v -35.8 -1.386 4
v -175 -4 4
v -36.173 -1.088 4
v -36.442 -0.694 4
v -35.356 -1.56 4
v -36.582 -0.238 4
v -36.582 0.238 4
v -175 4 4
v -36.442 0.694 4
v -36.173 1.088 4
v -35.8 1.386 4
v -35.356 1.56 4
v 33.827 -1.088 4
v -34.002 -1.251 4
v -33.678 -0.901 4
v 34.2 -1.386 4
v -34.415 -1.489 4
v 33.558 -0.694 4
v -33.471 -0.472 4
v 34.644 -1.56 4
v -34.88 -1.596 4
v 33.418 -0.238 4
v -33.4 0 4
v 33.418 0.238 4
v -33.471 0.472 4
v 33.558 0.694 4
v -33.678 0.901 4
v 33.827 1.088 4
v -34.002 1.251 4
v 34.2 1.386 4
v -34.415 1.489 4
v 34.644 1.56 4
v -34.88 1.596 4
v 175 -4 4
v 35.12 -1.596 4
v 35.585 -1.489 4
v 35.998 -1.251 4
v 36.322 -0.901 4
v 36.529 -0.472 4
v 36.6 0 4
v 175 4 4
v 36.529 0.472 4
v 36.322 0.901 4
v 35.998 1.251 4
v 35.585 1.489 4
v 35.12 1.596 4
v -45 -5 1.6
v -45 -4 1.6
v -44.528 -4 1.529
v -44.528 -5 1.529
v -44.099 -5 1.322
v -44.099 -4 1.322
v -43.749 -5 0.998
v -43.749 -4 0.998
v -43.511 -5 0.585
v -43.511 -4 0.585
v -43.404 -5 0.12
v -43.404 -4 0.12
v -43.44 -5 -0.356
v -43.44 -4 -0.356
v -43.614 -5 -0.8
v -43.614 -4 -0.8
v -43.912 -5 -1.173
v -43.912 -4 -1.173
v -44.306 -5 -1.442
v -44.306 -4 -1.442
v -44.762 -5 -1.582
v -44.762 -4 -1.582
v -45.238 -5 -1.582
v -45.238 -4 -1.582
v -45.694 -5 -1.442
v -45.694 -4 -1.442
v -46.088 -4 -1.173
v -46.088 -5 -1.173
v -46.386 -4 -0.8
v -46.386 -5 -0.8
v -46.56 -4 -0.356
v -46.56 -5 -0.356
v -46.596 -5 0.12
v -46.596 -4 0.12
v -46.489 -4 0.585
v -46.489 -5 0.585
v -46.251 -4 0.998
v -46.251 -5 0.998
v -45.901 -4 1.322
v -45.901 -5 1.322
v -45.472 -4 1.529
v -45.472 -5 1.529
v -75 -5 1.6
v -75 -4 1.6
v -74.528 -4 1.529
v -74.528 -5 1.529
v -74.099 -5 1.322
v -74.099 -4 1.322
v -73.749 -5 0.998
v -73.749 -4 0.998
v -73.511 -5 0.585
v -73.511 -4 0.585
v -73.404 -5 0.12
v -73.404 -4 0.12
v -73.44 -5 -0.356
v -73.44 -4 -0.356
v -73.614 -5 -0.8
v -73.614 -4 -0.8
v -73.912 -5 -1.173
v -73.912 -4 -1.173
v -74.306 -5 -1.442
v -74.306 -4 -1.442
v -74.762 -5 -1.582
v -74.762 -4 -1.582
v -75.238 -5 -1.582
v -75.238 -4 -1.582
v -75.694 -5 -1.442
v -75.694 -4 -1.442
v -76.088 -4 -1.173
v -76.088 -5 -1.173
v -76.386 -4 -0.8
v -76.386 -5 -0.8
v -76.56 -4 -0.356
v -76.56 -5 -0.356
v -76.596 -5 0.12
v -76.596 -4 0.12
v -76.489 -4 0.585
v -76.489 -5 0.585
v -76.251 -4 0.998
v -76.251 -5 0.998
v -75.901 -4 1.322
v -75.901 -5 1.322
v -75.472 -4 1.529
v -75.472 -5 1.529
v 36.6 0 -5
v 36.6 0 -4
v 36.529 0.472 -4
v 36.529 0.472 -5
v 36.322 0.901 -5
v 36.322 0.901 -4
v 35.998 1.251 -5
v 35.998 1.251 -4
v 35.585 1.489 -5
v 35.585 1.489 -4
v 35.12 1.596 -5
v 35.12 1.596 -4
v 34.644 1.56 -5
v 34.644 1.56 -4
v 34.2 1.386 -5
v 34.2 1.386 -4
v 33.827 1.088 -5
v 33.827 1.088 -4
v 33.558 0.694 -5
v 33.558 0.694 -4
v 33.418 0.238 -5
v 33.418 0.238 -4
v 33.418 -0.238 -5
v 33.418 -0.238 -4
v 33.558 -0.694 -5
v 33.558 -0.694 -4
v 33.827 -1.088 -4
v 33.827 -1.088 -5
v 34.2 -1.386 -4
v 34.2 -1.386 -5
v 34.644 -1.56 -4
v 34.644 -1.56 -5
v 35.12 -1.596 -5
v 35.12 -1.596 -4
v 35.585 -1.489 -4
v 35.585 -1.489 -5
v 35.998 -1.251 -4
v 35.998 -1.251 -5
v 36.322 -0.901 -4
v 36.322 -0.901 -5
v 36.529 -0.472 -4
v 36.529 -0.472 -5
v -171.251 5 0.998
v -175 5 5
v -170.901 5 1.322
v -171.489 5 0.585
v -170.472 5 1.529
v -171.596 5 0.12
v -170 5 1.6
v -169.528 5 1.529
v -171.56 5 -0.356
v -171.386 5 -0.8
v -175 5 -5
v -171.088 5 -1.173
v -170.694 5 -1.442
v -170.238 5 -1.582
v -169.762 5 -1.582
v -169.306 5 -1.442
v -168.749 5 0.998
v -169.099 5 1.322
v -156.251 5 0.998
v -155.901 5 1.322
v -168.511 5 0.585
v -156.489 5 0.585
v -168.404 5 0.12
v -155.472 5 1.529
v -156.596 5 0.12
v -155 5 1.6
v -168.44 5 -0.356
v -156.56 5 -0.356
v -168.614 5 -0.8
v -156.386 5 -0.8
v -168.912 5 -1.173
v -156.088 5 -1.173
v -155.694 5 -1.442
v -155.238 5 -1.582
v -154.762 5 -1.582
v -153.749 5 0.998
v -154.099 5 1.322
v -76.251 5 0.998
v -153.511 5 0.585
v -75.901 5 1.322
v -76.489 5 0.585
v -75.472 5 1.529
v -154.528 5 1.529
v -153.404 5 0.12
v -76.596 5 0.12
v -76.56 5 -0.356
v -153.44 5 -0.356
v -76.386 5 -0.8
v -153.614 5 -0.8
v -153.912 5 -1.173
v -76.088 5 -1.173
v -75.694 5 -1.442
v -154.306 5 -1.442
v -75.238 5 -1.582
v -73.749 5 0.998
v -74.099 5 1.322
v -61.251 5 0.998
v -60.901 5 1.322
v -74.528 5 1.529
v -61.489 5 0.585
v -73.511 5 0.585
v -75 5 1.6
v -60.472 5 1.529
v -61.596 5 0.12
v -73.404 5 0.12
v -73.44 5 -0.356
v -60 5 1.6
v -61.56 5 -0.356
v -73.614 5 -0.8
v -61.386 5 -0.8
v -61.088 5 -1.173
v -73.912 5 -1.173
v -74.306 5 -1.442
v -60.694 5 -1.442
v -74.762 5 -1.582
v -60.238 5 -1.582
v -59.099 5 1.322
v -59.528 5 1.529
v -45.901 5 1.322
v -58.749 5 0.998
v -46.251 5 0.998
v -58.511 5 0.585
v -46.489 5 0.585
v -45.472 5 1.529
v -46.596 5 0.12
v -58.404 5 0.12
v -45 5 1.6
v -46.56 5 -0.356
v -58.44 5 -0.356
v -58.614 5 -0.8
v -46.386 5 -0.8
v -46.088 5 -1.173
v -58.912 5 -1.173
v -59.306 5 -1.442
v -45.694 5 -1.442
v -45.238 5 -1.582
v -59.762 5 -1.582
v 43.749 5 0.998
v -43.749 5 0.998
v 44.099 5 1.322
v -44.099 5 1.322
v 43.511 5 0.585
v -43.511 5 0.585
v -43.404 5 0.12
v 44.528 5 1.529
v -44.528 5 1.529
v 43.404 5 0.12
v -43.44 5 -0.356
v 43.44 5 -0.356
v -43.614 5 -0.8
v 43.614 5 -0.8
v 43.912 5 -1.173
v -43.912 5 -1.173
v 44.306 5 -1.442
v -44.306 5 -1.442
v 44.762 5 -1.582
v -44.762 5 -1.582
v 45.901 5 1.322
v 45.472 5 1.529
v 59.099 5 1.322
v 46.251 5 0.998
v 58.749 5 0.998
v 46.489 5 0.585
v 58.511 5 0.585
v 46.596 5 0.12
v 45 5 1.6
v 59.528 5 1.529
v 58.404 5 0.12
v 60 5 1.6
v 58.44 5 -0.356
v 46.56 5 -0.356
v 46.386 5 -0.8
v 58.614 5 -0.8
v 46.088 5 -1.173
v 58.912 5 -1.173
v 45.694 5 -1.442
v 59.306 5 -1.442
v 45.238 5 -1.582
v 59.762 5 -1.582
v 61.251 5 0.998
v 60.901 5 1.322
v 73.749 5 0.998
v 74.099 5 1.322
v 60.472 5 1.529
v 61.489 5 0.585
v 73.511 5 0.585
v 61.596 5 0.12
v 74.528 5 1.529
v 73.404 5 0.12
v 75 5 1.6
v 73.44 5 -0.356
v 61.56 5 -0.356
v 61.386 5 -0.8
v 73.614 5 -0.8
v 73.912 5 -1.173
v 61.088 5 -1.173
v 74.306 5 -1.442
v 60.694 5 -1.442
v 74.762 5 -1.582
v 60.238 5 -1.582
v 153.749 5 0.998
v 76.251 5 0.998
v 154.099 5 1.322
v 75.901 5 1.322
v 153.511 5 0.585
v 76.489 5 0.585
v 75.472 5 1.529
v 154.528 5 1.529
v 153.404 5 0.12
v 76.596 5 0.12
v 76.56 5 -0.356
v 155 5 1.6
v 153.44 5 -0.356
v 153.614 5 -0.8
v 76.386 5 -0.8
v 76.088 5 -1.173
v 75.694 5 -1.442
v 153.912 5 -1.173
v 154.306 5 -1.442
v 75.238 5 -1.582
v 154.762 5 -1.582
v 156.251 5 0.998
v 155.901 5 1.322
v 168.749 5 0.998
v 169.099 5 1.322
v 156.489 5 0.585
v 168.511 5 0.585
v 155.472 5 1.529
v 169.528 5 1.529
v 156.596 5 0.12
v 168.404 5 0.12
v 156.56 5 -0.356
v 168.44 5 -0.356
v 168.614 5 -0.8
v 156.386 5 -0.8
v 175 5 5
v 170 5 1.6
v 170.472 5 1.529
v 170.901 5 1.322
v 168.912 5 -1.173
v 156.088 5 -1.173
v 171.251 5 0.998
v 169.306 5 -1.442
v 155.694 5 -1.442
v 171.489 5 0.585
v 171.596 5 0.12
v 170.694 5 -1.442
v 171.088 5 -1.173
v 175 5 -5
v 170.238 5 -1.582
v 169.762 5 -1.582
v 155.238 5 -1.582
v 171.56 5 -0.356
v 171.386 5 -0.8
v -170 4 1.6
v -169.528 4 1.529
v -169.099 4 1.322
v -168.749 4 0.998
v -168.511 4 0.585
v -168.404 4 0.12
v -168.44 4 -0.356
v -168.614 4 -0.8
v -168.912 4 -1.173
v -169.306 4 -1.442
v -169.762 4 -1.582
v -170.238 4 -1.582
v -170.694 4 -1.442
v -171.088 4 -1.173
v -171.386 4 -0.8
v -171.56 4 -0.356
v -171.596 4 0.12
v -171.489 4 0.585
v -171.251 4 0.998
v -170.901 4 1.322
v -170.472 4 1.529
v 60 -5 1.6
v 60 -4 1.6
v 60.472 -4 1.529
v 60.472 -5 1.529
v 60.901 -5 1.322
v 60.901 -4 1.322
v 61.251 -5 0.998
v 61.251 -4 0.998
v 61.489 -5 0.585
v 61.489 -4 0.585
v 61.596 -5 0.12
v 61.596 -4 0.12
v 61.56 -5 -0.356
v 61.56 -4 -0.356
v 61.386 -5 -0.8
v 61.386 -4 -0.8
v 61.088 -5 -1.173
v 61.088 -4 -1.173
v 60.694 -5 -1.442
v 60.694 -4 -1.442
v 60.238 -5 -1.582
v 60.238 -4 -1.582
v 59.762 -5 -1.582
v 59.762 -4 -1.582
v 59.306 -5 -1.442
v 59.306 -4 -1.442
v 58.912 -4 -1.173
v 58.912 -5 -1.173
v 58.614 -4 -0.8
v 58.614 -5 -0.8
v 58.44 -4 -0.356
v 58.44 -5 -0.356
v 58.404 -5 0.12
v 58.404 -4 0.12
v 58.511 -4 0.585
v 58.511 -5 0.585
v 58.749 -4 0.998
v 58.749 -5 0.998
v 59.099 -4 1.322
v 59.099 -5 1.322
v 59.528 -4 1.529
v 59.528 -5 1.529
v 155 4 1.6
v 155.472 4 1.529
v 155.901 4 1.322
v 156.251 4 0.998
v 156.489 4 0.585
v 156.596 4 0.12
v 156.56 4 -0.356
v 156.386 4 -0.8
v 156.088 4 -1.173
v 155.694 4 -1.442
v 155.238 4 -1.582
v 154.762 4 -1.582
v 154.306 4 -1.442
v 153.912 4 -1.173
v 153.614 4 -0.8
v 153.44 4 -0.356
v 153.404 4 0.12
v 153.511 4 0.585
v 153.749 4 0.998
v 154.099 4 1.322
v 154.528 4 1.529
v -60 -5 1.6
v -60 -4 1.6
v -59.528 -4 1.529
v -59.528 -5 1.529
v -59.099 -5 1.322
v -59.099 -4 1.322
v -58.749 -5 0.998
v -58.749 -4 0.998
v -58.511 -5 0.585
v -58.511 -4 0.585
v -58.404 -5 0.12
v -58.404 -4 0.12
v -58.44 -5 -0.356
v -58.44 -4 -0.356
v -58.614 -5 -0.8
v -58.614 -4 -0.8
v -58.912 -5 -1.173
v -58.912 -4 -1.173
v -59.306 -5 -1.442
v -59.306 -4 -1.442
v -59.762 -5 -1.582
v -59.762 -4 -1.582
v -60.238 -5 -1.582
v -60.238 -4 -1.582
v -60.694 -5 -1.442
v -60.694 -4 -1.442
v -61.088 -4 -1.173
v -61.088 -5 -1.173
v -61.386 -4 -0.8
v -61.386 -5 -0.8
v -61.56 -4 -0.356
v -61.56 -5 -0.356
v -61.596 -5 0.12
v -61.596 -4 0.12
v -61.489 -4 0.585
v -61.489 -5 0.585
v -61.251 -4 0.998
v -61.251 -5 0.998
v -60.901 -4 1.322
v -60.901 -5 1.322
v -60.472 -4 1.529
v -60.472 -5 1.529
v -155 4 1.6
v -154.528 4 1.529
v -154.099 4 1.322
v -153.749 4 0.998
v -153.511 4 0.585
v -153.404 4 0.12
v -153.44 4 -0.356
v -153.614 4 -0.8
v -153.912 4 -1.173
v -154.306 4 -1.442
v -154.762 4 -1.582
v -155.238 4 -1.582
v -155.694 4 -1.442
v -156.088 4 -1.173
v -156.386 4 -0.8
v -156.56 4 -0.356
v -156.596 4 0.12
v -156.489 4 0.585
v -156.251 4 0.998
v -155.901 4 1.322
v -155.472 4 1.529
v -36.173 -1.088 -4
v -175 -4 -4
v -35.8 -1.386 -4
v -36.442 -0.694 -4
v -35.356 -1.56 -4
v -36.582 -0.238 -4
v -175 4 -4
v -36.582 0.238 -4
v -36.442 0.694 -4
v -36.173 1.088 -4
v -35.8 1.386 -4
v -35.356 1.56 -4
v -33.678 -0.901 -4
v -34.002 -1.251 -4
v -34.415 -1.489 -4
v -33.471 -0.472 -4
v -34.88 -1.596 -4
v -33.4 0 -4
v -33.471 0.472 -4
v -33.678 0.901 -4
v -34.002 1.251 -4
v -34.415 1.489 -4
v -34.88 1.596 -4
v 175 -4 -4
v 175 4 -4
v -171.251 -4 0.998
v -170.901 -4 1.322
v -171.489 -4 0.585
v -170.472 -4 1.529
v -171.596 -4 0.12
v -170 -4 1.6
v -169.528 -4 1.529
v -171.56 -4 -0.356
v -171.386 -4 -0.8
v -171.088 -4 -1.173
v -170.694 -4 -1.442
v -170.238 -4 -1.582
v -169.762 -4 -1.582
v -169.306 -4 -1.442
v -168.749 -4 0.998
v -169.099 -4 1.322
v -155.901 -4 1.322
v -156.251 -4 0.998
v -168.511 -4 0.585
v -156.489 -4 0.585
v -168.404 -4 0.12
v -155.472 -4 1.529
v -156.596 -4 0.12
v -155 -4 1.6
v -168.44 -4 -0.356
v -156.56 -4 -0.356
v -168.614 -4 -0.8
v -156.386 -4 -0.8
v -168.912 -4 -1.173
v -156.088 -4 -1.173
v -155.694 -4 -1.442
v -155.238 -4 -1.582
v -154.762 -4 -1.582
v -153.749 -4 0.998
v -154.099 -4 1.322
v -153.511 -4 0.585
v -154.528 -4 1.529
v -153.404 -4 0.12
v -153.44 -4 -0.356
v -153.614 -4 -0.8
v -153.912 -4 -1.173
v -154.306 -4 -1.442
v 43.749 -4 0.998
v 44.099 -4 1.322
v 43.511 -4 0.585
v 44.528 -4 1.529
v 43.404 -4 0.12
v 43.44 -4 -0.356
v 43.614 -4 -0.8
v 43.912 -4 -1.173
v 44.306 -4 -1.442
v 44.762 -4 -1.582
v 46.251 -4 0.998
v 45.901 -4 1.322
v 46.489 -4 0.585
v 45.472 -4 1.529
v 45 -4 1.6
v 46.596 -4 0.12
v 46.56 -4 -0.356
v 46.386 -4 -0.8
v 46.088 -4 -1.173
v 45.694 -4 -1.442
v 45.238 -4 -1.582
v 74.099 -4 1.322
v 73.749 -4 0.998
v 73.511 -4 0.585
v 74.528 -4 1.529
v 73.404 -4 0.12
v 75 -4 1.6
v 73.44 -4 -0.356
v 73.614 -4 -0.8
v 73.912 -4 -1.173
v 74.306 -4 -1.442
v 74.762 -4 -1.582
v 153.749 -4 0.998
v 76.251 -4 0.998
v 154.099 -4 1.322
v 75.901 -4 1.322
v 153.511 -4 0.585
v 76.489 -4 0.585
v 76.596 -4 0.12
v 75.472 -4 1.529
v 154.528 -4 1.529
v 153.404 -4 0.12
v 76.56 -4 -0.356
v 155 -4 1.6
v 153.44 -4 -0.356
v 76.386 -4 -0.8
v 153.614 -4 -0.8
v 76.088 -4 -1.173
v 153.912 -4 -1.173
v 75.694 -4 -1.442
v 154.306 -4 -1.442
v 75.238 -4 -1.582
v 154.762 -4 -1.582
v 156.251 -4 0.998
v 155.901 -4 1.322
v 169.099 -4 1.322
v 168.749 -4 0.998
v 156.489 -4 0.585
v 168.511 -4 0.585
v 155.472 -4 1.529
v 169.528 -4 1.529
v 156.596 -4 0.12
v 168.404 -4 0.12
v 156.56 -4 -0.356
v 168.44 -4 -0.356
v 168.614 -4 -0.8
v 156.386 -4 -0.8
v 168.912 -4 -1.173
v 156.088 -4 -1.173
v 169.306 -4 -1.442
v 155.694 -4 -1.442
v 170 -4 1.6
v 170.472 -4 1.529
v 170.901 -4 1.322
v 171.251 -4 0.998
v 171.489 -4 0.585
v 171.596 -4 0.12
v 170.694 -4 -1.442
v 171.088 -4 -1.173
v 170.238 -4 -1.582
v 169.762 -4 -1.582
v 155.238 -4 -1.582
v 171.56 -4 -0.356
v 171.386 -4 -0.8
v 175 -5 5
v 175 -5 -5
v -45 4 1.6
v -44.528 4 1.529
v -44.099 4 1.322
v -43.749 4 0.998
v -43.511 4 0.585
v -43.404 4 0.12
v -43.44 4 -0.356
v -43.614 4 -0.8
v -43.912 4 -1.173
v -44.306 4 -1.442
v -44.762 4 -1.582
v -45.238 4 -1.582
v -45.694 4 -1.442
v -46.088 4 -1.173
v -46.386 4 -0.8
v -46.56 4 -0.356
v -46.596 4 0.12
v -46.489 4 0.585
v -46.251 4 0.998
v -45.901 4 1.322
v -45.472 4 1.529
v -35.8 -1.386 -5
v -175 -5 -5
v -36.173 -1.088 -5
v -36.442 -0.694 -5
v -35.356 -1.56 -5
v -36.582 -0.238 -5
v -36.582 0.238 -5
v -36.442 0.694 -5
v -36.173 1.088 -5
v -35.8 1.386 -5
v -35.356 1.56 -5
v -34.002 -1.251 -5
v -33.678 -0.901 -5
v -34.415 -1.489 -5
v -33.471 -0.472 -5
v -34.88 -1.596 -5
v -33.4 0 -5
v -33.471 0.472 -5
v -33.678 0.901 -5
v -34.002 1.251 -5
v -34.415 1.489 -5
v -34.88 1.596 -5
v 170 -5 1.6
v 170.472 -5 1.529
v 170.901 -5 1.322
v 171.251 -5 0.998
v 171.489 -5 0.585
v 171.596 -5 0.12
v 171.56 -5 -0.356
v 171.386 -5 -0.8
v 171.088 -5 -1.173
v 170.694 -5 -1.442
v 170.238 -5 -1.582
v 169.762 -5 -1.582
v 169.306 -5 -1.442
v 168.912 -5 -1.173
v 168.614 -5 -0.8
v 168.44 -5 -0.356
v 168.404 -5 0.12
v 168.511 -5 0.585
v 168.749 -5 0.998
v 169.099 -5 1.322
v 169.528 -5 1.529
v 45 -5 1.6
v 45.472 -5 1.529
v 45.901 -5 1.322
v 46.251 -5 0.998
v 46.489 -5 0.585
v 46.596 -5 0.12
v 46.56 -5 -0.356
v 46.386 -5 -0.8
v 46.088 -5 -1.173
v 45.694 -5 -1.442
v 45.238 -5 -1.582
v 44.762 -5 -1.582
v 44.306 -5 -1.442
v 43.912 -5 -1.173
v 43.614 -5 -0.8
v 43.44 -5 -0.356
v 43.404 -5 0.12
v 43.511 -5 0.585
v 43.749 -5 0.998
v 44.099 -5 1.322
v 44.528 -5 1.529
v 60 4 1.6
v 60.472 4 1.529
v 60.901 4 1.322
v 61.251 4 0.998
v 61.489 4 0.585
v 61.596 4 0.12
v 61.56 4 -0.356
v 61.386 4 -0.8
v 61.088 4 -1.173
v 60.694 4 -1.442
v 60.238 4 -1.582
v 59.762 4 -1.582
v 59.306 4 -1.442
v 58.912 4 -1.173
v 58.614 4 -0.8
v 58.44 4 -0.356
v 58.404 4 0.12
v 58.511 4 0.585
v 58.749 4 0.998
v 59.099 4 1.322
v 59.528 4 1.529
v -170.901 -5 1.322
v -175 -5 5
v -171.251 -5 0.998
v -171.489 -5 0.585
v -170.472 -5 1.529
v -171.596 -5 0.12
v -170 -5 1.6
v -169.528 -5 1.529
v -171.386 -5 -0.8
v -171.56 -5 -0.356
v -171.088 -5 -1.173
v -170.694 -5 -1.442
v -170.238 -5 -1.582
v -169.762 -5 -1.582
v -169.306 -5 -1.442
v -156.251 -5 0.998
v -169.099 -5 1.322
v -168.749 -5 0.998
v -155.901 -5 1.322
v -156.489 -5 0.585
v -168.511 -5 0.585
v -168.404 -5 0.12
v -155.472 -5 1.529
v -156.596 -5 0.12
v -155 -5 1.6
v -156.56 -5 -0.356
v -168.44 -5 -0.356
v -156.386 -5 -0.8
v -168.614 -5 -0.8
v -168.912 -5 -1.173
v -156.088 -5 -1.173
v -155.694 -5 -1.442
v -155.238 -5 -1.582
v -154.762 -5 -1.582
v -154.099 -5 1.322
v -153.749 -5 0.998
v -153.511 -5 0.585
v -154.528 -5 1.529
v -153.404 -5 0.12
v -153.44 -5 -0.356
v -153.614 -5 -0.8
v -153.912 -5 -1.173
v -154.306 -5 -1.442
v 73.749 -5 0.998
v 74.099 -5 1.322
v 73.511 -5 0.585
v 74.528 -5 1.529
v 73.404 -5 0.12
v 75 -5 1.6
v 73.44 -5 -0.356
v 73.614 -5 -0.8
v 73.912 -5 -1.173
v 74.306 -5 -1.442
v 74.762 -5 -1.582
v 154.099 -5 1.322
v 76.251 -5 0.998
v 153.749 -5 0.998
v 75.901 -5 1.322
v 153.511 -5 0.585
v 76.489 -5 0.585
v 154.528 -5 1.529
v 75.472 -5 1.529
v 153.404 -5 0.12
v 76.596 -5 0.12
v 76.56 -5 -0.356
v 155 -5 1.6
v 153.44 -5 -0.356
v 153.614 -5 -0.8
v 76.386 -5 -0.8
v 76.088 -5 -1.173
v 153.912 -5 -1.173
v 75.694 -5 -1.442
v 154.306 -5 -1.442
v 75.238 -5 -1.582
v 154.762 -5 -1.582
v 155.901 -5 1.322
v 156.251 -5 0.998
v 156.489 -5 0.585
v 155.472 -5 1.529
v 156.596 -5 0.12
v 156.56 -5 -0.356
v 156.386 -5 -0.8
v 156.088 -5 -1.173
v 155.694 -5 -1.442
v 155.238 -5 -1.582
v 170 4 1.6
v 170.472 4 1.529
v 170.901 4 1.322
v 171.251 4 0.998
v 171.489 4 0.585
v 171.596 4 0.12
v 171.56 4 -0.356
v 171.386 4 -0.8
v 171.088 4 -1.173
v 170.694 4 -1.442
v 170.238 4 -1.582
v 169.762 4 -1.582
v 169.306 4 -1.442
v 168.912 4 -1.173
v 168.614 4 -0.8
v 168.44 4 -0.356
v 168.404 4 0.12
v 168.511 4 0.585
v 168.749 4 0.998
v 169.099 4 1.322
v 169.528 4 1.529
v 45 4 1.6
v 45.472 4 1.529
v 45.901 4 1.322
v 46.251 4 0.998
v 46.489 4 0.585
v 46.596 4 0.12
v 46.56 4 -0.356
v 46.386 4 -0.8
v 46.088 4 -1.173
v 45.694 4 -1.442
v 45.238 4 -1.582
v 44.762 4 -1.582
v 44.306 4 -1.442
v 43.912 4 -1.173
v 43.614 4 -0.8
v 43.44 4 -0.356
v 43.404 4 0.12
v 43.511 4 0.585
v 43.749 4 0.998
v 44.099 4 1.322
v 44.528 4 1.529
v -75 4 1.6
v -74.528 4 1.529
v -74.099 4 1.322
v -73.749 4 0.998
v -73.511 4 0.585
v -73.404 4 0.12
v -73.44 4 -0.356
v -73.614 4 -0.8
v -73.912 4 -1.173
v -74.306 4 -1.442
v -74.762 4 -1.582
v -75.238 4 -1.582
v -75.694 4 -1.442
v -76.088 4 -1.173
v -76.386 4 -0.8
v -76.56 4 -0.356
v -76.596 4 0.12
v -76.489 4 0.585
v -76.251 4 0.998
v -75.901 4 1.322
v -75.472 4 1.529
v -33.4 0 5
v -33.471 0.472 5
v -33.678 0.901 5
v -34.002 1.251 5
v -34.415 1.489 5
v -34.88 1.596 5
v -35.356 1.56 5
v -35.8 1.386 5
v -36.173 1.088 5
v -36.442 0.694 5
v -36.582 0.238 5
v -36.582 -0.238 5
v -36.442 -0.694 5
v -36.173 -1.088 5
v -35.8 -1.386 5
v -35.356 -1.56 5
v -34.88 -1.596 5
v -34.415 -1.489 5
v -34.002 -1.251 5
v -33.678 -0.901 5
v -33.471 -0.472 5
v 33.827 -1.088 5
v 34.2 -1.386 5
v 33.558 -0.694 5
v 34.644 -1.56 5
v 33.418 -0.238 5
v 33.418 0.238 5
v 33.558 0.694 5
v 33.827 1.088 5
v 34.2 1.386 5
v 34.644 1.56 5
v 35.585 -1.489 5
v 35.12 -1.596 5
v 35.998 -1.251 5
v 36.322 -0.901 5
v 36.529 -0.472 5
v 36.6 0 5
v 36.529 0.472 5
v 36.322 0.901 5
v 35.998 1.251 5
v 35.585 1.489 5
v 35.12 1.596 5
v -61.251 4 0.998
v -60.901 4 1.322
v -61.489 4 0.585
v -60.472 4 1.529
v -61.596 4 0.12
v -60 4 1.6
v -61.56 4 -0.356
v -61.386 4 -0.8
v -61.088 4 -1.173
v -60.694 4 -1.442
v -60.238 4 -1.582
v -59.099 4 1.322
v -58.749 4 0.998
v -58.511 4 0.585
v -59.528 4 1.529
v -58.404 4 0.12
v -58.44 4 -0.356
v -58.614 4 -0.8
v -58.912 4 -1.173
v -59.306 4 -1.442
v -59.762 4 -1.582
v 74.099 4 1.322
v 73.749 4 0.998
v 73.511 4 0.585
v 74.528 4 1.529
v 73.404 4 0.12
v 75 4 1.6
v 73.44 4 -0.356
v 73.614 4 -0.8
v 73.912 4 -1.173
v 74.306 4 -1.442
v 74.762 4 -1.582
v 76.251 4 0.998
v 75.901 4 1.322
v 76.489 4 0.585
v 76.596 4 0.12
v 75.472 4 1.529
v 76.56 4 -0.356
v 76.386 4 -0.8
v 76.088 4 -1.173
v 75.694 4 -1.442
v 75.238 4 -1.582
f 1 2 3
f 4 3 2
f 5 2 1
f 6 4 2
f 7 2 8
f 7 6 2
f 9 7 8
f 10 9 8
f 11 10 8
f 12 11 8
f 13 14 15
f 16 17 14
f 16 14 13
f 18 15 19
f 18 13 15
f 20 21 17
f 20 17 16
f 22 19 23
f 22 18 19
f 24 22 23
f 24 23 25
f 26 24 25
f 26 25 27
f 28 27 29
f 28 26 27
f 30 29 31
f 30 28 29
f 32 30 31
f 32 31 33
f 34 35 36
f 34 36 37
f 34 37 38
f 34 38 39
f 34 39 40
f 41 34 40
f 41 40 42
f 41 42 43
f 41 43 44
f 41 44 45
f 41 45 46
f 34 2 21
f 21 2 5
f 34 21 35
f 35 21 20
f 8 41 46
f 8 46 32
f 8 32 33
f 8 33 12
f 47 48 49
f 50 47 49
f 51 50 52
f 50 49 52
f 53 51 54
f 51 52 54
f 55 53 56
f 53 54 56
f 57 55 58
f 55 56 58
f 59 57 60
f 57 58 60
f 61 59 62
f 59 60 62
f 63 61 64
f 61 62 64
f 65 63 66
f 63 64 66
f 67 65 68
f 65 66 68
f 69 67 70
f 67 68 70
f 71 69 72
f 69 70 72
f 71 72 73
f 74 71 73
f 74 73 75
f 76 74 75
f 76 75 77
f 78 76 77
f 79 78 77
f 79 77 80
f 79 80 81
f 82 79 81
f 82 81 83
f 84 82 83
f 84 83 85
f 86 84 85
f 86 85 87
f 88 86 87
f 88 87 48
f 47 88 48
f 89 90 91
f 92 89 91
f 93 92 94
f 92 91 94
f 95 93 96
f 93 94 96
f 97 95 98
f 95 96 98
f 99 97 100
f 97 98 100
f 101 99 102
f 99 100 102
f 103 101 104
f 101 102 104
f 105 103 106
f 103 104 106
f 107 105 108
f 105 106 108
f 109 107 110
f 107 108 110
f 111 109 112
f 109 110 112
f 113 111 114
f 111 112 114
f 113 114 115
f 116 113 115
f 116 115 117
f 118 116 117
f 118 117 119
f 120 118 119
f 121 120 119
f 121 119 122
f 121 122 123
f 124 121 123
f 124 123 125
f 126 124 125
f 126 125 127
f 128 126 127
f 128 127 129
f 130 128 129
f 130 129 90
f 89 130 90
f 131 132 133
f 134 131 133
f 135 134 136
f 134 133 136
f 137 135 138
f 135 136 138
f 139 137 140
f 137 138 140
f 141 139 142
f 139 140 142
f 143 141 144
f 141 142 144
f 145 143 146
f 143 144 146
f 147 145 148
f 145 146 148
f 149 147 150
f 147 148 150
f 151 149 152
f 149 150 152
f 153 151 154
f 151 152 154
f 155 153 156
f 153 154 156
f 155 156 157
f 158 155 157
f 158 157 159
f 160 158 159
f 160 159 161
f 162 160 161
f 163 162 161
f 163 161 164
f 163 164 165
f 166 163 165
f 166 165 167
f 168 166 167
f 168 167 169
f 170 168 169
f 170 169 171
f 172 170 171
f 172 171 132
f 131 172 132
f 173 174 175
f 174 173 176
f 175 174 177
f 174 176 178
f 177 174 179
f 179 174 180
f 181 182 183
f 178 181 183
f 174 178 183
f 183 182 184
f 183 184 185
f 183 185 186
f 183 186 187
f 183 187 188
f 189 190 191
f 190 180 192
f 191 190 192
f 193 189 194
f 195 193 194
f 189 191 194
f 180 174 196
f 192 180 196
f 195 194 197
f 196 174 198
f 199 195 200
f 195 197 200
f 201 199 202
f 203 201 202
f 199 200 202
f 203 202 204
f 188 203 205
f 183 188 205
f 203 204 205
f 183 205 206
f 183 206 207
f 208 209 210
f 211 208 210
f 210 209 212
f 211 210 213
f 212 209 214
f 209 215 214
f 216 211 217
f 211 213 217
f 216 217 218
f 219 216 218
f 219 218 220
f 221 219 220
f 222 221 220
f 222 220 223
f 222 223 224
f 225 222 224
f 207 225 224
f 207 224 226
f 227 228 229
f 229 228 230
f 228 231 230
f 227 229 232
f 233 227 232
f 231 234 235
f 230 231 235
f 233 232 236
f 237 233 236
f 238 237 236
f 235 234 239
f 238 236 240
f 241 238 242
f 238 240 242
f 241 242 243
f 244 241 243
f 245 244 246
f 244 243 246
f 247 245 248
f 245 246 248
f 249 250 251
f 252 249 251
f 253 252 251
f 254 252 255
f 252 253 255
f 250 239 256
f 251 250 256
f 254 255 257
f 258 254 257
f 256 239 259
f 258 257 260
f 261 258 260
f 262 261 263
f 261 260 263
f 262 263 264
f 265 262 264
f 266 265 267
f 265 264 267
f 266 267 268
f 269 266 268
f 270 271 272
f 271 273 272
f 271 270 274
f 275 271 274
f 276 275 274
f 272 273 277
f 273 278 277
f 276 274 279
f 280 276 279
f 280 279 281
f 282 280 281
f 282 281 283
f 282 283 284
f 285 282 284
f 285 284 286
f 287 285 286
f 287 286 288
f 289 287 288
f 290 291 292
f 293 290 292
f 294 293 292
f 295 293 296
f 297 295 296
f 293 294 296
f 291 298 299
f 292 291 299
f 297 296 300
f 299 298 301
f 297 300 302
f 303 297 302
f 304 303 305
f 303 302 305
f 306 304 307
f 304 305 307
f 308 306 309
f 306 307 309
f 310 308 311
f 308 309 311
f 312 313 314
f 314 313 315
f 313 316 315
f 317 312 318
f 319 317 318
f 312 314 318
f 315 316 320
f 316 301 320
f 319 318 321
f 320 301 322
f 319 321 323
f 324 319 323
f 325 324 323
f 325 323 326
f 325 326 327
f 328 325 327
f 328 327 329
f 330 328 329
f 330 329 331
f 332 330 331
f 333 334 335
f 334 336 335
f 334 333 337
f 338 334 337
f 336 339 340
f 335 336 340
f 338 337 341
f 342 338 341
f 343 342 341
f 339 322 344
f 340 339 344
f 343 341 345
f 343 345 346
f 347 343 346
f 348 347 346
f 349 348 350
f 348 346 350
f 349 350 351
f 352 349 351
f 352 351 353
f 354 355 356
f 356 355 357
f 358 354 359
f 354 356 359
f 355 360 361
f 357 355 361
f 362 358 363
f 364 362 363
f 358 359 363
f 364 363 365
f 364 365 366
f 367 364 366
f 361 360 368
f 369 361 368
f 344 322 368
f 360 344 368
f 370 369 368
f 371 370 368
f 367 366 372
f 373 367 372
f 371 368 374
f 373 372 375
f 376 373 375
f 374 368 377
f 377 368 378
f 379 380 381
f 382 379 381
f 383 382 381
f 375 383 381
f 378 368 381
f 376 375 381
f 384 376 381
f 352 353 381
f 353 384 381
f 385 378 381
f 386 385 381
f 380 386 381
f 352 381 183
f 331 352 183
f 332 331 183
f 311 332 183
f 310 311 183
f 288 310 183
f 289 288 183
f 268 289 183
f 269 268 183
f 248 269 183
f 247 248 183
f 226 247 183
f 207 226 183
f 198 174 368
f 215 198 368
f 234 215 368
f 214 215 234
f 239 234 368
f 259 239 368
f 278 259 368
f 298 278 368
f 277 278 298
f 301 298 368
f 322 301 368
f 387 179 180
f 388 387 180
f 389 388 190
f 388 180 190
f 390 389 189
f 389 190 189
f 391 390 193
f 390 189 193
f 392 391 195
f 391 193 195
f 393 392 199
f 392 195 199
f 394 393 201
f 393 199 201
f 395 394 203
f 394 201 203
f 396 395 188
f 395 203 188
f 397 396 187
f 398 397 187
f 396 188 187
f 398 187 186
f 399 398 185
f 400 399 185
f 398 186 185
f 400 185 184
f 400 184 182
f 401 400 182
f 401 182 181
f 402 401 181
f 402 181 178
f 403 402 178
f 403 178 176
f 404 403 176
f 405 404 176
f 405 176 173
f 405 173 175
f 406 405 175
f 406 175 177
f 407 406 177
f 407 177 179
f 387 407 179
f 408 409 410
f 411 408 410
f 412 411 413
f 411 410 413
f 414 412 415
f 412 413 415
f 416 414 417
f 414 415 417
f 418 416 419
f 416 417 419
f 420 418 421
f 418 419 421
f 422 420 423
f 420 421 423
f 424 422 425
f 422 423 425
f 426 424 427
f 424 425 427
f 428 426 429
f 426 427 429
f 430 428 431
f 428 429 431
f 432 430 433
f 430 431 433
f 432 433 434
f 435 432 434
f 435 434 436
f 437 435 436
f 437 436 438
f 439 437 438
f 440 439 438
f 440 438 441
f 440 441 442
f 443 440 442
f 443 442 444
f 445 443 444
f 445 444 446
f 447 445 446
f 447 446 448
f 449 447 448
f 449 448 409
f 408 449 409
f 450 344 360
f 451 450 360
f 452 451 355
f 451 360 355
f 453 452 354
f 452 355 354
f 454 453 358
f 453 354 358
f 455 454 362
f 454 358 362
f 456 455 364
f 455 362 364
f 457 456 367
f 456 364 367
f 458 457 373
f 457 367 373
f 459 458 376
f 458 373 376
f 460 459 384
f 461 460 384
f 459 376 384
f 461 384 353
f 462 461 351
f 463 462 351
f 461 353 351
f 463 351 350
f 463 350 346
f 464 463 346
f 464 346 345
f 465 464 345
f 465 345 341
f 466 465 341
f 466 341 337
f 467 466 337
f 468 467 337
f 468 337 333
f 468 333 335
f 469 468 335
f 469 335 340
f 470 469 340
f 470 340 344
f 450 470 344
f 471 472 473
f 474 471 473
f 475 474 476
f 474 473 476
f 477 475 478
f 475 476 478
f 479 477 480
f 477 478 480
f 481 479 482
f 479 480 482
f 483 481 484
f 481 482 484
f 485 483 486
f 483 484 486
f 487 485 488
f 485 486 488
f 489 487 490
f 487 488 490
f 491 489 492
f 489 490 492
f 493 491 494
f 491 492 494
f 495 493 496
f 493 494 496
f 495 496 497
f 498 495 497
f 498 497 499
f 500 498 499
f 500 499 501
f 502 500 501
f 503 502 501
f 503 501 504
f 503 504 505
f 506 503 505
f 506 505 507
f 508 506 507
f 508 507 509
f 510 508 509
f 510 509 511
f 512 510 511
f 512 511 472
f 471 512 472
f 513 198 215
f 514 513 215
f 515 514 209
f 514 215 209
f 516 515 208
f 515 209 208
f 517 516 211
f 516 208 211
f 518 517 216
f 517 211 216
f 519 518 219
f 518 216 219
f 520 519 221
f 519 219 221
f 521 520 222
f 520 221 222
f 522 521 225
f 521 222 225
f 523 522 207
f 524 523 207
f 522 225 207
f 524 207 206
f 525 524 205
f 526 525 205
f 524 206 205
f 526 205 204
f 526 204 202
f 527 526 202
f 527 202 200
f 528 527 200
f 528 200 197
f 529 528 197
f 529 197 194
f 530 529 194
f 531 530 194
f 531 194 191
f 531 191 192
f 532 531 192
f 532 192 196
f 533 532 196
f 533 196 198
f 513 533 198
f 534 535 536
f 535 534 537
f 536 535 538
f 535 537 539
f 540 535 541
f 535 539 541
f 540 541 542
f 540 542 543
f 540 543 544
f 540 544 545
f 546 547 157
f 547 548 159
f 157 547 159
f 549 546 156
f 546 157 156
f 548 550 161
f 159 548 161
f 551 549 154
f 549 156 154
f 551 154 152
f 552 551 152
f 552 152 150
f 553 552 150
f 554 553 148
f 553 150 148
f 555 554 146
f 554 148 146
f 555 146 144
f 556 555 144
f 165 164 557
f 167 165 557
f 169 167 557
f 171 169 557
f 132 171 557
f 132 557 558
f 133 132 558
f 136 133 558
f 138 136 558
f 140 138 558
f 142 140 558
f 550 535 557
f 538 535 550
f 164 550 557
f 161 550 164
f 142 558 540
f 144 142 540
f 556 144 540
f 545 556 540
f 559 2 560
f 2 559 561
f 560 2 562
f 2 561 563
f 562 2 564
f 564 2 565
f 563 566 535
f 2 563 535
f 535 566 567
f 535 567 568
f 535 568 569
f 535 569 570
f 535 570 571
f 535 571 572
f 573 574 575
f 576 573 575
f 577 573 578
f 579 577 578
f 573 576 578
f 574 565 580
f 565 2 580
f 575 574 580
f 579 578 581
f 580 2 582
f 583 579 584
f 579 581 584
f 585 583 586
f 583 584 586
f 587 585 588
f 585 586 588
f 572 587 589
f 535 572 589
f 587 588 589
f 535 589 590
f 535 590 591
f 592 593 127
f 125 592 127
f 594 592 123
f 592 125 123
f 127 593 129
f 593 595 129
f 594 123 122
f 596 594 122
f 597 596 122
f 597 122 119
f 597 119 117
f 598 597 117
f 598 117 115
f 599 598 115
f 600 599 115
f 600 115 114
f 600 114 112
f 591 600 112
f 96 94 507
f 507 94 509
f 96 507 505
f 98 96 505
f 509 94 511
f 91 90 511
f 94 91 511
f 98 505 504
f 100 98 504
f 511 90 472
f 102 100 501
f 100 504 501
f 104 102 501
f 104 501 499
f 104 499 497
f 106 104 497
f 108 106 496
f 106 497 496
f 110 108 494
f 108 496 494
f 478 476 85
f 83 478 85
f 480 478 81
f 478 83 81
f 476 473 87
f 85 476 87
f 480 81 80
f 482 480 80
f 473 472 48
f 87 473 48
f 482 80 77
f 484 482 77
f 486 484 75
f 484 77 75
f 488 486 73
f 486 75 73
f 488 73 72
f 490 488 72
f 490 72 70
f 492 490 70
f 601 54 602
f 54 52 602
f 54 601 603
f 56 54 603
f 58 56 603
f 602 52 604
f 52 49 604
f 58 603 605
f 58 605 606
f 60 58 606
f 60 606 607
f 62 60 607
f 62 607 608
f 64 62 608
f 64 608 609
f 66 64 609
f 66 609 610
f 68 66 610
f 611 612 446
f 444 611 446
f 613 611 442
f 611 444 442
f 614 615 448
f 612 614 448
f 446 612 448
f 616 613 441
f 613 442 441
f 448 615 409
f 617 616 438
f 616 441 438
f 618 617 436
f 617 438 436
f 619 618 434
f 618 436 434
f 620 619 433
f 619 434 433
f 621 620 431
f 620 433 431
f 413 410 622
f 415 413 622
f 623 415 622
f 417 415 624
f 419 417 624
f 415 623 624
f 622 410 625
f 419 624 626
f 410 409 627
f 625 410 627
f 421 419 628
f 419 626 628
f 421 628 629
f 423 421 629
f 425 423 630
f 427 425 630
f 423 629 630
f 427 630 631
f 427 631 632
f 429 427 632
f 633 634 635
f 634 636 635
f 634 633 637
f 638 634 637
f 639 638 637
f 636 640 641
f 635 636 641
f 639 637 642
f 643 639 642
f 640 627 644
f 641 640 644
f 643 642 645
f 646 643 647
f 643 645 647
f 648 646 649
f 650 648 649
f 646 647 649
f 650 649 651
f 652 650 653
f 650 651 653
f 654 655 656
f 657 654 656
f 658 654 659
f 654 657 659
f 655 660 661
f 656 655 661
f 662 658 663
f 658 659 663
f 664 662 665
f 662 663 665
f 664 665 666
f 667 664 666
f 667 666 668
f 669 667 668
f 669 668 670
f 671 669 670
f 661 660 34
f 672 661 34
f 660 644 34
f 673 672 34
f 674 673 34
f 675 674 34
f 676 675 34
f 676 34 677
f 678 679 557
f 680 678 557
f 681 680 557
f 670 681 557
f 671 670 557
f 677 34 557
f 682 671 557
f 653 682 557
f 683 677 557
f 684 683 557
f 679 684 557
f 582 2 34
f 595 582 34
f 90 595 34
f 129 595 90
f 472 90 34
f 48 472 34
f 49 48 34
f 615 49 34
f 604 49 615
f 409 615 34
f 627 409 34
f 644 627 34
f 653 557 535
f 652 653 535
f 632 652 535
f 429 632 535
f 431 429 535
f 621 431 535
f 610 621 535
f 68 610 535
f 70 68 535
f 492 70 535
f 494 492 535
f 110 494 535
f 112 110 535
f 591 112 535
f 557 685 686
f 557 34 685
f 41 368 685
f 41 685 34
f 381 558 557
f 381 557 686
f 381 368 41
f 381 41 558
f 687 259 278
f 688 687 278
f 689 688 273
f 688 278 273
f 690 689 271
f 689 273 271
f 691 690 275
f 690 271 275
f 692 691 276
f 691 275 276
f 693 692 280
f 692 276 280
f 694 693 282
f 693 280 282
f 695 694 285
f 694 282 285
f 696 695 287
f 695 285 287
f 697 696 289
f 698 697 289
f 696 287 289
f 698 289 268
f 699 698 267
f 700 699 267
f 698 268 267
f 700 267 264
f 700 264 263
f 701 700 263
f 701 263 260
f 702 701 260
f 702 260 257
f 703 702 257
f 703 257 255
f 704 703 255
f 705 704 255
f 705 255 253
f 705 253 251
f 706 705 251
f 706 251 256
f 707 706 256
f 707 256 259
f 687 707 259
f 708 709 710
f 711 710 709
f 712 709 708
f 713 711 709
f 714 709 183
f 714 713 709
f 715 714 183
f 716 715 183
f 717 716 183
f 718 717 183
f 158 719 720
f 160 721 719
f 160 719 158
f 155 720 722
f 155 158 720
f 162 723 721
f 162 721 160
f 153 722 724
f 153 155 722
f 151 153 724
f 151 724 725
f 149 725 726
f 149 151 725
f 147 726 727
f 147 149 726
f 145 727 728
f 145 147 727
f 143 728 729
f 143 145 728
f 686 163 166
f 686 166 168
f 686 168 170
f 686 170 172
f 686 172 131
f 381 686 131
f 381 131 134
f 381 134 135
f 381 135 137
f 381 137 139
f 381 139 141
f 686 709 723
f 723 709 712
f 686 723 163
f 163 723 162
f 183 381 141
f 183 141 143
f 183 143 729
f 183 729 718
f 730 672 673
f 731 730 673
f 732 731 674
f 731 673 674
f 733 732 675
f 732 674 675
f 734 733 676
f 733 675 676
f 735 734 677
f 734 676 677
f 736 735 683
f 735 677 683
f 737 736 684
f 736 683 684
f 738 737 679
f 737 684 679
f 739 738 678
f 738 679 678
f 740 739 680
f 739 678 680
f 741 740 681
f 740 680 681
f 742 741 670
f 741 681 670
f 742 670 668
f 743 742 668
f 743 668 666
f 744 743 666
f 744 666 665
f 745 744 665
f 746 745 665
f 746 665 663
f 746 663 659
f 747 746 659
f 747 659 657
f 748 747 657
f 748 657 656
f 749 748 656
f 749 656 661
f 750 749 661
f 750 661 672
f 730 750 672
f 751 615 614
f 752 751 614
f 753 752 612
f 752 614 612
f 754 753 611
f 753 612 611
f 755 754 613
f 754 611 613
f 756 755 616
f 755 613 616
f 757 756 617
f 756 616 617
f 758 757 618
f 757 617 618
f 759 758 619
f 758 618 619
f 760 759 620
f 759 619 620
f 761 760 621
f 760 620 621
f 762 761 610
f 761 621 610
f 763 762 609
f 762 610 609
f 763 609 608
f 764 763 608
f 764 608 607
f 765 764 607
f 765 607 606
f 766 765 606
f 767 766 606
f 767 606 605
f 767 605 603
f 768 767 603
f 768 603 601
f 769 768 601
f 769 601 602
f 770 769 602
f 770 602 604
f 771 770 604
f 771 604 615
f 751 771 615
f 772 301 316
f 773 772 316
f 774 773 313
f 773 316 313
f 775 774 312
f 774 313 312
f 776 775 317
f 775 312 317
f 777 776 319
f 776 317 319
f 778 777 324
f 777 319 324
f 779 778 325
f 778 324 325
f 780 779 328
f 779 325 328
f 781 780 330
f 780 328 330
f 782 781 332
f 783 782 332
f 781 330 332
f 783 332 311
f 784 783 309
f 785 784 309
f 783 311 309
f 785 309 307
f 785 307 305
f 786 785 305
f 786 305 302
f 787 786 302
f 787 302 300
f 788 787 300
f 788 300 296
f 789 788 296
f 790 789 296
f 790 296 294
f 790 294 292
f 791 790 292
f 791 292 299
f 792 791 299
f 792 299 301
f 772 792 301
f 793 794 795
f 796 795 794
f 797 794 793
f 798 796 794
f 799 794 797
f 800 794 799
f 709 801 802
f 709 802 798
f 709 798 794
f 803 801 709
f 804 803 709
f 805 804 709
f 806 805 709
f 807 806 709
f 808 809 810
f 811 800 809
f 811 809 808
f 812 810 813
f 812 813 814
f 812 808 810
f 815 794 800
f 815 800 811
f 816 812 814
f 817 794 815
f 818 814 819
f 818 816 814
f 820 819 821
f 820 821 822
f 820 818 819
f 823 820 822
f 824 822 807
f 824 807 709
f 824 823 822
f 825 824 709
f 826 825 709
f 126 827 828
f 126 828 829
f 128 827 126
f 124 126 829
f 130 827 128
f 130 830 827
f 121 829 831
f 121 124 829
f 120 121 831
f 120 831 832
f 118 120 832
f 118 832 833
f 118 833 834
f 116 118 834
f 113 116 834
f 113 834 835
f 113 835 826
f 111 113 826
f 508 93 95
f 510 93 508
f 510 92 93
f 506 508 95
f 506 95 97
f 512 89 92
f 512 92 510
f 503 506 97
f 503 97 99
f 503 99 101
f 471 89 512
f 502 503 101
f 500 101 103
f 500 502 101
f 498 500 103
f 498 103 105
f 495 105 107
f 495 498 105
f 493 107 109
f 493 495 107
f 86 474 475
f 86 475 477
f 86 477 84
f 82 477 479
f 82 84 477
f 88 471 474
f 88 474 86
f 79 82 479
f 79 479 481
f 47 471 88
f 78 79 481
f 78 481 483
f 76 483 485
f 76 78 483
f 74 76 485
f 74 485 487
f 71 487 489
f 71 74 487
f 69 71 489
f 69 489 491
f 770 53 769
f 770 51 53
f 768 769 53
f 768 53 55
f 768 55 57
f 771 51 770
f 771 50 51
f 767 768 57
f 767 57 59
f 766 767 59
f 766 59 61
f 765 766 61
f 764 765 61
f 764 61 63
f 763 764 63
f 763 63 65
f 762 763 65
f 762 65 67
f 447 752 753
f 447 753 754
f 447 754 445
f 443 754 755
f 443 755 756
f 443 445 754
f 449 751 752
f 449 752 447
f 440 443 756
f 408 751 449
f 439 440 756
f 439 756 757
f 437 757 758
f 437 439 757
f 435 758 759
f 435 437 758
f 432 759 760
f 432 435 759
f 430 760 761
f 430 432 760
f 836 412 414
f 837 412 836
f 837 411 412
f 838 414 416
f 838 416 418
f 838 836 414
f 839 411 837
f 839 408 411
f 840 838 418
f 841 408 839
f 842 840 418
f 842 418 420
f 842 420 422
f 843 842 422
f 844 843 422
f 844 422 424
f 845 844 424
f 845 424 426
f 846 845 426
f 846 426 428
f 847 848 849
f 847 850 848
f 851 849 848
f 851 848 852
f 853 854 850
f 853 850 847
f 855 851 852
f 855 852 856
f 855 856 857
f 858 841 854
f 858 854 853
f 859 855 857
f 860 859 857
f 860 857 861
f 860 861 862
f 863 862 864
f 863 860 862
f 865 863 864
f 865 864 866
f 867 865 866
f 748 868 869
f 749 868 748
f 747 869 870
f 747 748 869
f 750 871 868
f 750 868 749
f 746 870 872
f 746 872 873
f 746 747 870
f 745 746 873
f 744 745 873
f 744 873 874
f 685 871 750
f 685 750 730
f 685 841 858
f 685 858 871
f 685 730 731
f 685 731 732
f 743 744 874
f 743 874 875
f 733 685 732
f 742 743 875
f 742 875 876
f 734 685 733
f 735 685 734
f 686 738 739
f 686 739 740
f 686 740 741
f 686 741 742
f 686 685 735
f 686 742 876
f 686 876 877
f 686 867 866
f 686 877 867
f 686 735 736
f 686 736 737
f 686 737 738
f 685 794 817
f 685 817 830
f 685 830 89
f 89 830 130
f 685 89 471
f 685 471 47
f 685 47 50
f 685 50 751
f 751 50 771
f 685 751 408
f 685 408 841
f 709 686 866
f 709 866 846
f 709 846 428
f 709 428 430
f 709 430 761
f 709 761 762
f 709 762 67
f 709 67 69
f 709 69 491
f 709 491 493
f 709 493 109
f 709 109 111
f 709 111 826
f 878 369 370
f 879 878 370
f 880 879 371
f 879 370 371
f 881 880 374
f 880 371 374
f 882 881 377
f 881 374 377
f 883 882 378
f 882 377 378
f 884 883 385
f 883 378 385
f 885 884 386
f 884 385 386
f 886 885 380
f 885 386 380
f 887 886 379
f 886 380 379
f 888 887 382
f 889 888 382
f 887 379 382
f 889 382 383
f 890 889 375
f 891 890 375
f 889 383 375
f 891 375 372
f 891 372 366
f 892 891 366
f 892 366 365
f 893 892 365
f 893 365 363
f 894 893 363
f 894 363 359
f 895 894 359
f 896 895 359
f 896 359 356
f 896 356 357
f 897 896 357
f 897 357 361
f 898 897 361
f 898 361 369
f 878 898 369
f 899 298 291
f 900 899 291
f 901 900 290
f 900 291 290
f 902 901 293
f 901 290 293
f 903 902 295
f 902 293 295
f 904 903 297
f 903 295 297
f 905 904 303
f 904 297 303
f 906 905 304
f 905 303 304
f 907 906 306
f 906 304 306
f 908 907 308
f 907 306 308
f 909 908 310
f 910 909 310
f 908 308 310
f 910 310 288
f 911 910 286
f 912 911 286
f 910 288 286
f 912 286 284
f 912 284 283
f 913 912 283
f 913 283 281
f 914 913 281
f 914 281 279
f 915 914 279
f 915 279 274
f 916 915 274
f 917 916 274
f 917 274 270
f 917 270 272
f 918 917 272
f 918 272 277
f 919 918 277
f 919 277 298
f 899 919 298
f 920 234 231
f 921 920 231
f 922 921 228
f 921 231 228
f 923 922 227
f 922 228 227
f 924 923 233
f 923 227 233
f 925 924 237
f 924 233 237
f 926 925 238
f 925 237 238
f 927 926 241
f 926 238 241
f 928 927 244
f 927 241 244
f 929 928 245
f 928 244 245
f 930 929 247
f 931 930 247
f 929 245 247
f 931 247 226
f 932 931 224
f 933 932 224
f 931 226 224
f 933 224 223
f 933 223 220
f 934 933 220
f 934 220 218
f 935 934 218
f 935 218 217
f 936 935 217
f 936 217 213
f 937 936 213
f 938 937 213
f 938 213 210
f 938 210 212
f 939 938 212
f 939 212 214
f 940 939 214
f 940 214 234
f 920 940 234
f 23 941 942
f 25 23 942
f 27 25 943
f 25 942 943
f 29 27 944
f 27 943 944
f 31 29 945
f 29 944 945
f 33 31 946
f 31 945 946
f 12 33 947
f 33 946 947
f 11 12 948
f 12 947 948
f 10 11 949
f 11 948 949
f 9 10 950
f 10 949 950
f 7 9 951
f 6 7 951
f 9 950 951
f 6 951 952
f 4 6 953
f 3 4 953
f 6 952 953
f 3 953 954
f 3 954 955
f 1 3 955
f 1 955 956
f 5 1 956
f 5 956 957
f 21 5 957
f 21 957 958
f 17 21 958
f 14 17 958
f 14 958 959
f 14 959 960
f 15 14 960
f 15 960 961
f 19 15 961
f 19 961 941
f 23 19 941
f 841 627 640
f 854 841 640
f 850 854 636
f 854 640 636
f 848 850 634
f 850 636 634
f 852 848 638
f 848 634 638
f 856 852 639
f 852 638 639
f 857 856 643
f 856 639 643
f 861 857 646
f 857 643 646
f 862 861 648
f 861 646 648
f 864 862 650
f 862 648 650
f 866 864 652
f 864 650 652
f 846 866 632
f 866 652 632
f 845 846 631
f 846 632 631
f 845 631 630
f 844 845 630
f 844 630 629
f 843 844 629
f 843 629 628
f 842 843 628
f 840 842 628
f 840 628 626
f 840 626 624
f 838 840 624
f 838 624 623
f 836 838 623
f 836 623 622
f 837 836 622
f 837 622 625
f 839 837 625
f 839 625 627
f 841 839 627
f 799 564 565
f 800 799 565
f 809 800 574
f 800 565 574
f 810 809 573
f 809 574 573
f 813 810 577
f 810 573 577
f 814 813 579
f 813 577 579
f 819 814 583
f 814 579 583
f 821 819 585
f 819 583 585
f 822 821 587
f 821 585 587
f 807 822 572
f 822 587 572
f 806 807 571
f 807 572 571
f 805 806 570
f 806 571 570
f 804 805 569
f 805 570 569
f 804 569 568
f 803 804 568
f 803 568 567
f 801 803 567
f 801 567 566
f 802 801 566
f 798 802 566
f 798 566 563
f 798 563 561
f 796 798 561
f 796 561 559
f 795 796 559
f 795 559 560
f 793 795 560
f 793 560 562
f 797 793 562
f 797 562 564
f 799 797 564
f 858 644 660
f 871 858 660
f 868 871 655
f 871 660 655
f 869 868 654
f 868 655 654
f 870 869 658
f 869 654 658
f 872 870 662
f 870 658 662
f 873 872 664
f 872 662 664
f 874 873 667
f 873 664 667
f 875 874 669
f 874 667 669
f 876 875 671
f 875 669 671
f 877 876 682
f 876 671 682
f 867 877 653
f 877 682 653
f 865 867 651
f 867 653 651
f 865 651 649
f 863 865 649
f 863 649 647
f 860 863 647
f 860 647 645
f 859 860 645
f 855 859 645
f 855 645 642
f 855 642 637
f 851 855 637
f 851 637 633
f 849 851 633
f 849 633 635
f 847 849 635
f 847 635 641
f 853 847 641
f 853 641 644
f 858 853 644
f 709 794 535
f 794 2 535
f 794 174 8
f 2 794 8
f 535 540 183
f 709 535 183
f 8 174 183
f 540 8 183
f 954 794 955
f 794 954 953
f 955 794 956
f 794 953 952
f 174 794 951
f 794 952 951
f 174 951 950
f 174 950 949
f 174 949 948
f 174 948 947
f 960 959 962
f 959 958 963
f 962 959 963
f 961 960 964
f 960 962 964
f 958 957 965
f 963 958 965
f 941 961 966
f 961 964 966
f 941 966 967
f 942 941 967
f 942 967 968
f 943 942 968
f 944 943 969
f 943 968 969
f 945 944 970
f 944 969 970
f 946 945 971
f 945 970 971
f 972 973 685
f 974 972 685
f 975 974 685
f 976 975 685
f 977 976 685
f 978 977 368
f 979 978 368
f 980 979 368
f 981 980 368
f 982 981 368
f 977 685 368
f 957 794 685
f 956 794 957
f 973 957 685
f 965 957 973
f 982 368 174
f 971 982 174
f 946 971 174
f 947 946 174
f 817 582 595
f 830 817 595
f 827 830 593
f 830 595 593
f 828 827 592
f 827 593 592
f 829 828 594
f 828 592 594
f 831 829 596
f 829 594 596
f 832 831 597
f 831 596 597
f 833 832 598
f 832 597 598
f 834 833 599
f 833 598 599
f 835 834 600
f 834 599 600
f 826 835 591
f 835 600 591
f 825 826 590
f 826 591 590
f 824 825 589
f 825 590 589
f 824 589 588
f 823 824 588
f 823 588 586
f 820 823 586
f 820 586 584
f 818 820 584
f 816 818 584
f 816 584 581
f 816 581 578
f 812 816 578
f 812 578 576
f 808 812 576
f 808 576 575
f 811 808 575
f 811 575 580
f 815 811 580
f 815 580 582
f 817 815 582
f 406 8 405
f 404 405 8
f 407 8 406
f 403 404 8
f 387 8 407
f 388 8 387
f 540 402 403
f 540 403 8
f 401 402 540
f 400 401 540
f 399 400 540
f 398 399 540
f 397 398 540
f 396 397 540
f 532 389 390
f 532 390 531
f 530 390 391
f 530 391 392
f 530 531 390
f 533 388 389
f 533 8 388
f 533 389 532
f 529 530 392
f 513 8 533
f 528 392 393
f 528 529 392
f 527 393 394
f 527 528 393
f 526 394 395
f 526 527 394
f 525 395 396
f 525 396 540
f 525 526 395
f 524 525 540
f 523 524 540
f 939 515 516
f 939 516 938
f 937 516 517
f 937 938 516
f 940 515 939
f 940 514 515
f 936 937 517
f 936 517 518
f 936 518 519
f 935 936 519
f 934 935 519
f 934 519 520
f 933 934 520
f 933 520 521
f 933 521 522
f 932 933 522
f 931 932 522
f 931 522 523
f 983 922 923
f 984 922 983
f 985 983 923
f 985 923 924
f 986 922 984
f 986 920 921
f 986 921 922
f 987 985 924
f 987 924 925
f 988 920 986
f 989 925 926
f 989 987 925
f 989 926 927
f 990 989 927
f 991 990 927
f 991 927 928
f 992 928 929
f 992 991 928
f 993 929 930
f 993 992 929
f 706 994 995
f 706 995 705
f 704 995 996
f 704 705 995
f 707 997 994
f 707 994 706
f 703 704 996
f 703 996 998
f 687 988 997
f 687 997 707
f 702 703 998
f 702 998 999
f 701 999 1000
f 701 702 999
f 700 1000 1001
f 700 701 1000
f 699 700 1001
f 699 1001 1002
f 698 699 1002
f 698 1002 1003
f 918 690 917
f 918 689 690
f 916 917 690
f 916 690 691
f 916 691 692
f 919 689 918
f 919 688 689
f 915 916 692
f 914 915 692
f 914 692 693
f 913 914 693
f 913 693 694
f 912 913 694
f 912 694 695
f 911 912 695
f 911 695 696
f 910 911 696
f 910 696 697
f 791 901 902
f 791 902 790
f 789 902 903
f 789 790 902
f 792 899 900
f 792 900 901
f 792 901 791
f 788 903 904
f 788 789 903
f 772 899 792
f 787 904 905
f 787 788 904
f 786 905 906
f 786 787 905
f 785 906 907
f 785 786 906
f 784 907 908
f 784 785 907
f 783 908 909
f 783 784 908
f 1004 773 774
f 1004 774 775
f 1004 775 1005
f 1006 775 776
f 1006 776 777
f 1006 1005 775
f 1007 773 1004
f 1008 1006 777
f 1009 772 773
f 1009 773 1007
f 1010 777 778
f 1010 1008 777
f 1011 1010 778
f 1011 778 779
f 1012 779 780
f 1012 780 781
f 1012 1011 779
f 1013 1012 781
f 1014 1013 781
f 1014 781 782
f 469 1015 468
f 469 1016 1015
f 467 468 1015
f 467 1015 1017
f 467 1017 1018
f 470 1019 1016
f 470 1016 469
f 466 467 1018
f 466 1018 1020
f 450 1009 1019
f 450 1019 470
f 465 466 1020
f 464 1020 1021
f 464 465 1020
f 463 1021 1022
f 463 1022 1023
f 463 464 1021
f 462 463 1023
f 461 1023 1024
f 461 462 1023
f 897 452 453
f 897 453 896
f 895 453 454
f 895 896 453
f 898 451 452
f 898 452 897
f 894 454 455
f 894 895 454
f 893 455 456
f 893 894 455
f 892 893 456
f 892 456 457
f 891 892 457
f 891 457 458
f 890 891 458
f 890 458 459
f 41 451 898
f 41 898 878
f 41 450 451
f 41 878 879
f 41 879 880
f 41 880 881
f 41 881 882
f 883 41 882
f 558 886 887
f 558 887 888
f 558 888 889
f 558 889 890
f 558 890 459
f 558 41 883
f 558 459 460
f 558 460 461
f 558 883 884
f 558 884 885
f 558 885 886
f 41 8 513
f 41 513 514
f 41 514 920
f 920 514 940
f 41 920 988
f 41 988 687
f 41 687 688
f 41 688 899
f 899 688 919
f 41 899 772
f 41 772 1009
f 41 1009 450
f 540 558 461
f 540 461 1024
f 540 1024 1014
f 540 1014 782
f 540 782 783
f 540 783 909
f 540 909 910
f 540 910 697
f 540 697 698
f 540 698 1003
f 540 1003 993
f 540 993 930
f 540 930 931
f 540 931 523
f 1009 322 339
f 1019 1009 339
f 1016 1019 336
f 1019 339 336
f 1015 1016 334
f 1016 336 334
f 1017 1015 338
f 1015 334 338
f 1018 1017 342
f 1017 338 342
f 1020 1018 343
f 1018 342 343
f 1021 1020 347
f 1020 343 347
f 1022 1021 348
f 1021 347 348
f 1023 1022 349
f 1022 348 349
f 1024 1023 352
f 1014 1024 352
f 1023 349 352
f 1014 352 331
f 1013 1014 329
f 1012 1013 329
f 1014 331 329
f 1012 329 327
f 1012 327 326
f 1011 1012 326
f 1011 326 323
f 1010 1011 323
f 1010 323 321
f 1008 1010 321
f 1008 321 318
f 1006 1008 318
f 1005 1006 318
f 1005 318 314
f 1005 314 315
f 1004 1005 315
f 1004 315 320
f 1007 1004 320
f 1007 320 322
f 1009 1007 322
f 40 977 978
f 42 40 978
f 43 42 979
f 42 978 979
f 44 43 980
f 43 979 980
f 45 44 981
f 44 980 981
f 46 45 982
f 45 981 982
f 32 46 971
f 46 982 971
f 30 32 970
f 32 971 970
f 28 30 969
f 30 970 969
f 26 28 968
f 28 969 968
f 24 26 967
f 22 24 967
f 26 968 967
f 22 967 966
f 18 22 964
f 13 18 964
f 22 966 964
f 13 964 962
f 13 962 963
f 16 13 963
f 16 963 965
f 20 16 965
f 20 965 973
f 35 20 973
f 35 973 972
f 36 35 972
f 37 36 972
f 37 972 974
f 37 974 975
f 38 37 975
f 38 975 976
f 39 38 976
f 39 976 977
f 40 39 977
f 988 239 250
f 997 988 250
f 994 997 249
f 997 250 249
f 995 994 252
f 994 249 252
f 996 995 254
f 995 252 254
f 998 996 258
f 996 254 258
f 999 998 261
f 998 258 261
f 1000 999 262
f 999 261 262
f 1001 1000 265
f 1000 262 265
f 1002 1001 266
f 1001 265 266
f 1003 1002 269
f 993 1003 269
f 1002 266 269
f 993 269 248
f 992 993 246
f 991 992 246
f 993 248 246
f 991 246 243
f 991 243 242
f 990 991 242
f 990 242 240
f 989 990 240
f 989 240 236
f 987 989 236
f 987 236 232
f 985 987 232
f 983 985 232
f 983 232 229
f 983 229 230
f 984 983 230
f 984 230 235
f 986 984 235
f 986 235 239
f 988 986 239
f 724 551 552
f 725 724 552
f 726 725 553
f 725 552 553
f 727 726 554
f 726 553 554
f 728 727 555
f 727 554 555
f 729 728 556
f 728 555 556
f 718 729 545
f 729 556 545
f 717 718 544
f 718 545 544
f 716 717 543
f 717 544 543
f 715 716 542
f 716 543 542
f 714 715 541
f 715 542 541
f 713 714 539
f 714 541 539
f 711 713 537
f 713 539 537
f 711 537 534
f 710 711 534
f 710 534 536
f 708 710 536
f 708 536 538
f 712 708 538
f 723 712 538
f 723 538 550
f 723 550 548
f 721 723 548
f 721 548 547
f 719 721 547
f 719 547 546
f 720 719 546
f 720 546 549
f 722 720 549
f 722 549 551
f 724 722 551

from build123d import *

# Parameters (mm, degrees)
SKETCH_1_W          = 10
SKETCH_1_H          = 10
EXTRUDE_1_DEPTH     = 175
SKETCH_2_W          = 8
SKETCH_2_H          = 8
CUT_EXTRUDE_1_DEPTH = 351.071421284
SKETCH_3_R          = 1.6
CUT_EXTRUDE_2_DEPTH = 176.356779168
SKETCH_4_R          = 1.6
CUT_EXTRUDE_3_DEPTH = 176.356779168
SKETCH_5_R          = 1.6
CUT_EXTRUDE_4_DEPTH = 176.356779168


with BuildPart() as part:
    # ｽｹｯﾁ1 → ﾎﾞｽ - 押し出し1 (new, symmetric)
    with BuildSketch(Plane(origin=(0, 0, 0), x_dir=(0, 0, -1), z_dir=(1, 0, 0))):
        Rectangle(SKETCH_1_W, SKETCH_1_H)
    extrude(amount=EXTRUDE_1_DEPTH, both=True)

    # ｽｹｯﾁ2 → ｶｯﾄ - 押し出し1 (cut, through all)
    with BuildSketch(Plane(origin=(175, 0, 0), x_dir=(0, 0, -1), z_dir=(1, 0, 0))):
        Rectangle(SKETCH_2_W, SKETCH_2_H)
    extrude(amount=-CUT_EXTRUDE_1_DEPTH, mode=Mode.SUBTRACT)

    # ｽｹｯﾁ3 → ｶｯﾄ - 押し出し2 (cut, through all)
    with BuildSketch(Plane(origin=(0, 5, 0), x_dir=(1, 0, 0), z_dir=(0, 1, 0))):
        with Locations((-170, 0)):
            Circle(SKETCH_3_R)
        with Locations((-155, 0)):
            Circle(SKETCH_3_R)
        with Locations((170, 0)):
            Circle(SKETCH_3_R)
        with Locations((155, 0)):
            Circle(SKETCH_3_R)
    extrude(amount=-CUT_EXTRUDE_2_DEPTH, mode=Mode.SUBTRACT)

    # ｽｹｯﾁ4 → ｶｯﾄ - 押し出し3 (cut, through all)
    with BuildSketch(Plane(origin=(0, 5, 0), x_dir=(1, 0, 0), z_dir=(0, 1, 0))):
        with Locations((-75, 0)):
            Circle(SKETCH_4_R)
        with Locations((-60, 0)):
            Circle(SKETCH_4_R)
        with Locations((-45, 0)):
            Circle(SKETCH_4_R)
        with Locations((45, 0)):
            Circle(SKETCH_4_R)
        with Locations((60, 0)):
            Circle(SKETCH_4_R)
        with Locations((75, 0)):
            Circle(SKETCH_4_R)
    extrude(amount=-CUT_EXTRUDE_3_DEPTH, mode=Mode.SUBTRACT)

    # ｽｹｯﾁ5 → ｶｯﾄ - 押し出し4 (cut, through all)
    with BuildSketch(Plane.XY.offset(5)):
        with Locations((-35, 0)):
            Circle(SKETCH_5_R)
        with Locations((35, 0)):
            Circle(SKETCH_5_R)
    extrude(amount=-CUT_EXTRUDE_4_DEPTH, mode=Mode.SUBTRACT)


solid = part.part
